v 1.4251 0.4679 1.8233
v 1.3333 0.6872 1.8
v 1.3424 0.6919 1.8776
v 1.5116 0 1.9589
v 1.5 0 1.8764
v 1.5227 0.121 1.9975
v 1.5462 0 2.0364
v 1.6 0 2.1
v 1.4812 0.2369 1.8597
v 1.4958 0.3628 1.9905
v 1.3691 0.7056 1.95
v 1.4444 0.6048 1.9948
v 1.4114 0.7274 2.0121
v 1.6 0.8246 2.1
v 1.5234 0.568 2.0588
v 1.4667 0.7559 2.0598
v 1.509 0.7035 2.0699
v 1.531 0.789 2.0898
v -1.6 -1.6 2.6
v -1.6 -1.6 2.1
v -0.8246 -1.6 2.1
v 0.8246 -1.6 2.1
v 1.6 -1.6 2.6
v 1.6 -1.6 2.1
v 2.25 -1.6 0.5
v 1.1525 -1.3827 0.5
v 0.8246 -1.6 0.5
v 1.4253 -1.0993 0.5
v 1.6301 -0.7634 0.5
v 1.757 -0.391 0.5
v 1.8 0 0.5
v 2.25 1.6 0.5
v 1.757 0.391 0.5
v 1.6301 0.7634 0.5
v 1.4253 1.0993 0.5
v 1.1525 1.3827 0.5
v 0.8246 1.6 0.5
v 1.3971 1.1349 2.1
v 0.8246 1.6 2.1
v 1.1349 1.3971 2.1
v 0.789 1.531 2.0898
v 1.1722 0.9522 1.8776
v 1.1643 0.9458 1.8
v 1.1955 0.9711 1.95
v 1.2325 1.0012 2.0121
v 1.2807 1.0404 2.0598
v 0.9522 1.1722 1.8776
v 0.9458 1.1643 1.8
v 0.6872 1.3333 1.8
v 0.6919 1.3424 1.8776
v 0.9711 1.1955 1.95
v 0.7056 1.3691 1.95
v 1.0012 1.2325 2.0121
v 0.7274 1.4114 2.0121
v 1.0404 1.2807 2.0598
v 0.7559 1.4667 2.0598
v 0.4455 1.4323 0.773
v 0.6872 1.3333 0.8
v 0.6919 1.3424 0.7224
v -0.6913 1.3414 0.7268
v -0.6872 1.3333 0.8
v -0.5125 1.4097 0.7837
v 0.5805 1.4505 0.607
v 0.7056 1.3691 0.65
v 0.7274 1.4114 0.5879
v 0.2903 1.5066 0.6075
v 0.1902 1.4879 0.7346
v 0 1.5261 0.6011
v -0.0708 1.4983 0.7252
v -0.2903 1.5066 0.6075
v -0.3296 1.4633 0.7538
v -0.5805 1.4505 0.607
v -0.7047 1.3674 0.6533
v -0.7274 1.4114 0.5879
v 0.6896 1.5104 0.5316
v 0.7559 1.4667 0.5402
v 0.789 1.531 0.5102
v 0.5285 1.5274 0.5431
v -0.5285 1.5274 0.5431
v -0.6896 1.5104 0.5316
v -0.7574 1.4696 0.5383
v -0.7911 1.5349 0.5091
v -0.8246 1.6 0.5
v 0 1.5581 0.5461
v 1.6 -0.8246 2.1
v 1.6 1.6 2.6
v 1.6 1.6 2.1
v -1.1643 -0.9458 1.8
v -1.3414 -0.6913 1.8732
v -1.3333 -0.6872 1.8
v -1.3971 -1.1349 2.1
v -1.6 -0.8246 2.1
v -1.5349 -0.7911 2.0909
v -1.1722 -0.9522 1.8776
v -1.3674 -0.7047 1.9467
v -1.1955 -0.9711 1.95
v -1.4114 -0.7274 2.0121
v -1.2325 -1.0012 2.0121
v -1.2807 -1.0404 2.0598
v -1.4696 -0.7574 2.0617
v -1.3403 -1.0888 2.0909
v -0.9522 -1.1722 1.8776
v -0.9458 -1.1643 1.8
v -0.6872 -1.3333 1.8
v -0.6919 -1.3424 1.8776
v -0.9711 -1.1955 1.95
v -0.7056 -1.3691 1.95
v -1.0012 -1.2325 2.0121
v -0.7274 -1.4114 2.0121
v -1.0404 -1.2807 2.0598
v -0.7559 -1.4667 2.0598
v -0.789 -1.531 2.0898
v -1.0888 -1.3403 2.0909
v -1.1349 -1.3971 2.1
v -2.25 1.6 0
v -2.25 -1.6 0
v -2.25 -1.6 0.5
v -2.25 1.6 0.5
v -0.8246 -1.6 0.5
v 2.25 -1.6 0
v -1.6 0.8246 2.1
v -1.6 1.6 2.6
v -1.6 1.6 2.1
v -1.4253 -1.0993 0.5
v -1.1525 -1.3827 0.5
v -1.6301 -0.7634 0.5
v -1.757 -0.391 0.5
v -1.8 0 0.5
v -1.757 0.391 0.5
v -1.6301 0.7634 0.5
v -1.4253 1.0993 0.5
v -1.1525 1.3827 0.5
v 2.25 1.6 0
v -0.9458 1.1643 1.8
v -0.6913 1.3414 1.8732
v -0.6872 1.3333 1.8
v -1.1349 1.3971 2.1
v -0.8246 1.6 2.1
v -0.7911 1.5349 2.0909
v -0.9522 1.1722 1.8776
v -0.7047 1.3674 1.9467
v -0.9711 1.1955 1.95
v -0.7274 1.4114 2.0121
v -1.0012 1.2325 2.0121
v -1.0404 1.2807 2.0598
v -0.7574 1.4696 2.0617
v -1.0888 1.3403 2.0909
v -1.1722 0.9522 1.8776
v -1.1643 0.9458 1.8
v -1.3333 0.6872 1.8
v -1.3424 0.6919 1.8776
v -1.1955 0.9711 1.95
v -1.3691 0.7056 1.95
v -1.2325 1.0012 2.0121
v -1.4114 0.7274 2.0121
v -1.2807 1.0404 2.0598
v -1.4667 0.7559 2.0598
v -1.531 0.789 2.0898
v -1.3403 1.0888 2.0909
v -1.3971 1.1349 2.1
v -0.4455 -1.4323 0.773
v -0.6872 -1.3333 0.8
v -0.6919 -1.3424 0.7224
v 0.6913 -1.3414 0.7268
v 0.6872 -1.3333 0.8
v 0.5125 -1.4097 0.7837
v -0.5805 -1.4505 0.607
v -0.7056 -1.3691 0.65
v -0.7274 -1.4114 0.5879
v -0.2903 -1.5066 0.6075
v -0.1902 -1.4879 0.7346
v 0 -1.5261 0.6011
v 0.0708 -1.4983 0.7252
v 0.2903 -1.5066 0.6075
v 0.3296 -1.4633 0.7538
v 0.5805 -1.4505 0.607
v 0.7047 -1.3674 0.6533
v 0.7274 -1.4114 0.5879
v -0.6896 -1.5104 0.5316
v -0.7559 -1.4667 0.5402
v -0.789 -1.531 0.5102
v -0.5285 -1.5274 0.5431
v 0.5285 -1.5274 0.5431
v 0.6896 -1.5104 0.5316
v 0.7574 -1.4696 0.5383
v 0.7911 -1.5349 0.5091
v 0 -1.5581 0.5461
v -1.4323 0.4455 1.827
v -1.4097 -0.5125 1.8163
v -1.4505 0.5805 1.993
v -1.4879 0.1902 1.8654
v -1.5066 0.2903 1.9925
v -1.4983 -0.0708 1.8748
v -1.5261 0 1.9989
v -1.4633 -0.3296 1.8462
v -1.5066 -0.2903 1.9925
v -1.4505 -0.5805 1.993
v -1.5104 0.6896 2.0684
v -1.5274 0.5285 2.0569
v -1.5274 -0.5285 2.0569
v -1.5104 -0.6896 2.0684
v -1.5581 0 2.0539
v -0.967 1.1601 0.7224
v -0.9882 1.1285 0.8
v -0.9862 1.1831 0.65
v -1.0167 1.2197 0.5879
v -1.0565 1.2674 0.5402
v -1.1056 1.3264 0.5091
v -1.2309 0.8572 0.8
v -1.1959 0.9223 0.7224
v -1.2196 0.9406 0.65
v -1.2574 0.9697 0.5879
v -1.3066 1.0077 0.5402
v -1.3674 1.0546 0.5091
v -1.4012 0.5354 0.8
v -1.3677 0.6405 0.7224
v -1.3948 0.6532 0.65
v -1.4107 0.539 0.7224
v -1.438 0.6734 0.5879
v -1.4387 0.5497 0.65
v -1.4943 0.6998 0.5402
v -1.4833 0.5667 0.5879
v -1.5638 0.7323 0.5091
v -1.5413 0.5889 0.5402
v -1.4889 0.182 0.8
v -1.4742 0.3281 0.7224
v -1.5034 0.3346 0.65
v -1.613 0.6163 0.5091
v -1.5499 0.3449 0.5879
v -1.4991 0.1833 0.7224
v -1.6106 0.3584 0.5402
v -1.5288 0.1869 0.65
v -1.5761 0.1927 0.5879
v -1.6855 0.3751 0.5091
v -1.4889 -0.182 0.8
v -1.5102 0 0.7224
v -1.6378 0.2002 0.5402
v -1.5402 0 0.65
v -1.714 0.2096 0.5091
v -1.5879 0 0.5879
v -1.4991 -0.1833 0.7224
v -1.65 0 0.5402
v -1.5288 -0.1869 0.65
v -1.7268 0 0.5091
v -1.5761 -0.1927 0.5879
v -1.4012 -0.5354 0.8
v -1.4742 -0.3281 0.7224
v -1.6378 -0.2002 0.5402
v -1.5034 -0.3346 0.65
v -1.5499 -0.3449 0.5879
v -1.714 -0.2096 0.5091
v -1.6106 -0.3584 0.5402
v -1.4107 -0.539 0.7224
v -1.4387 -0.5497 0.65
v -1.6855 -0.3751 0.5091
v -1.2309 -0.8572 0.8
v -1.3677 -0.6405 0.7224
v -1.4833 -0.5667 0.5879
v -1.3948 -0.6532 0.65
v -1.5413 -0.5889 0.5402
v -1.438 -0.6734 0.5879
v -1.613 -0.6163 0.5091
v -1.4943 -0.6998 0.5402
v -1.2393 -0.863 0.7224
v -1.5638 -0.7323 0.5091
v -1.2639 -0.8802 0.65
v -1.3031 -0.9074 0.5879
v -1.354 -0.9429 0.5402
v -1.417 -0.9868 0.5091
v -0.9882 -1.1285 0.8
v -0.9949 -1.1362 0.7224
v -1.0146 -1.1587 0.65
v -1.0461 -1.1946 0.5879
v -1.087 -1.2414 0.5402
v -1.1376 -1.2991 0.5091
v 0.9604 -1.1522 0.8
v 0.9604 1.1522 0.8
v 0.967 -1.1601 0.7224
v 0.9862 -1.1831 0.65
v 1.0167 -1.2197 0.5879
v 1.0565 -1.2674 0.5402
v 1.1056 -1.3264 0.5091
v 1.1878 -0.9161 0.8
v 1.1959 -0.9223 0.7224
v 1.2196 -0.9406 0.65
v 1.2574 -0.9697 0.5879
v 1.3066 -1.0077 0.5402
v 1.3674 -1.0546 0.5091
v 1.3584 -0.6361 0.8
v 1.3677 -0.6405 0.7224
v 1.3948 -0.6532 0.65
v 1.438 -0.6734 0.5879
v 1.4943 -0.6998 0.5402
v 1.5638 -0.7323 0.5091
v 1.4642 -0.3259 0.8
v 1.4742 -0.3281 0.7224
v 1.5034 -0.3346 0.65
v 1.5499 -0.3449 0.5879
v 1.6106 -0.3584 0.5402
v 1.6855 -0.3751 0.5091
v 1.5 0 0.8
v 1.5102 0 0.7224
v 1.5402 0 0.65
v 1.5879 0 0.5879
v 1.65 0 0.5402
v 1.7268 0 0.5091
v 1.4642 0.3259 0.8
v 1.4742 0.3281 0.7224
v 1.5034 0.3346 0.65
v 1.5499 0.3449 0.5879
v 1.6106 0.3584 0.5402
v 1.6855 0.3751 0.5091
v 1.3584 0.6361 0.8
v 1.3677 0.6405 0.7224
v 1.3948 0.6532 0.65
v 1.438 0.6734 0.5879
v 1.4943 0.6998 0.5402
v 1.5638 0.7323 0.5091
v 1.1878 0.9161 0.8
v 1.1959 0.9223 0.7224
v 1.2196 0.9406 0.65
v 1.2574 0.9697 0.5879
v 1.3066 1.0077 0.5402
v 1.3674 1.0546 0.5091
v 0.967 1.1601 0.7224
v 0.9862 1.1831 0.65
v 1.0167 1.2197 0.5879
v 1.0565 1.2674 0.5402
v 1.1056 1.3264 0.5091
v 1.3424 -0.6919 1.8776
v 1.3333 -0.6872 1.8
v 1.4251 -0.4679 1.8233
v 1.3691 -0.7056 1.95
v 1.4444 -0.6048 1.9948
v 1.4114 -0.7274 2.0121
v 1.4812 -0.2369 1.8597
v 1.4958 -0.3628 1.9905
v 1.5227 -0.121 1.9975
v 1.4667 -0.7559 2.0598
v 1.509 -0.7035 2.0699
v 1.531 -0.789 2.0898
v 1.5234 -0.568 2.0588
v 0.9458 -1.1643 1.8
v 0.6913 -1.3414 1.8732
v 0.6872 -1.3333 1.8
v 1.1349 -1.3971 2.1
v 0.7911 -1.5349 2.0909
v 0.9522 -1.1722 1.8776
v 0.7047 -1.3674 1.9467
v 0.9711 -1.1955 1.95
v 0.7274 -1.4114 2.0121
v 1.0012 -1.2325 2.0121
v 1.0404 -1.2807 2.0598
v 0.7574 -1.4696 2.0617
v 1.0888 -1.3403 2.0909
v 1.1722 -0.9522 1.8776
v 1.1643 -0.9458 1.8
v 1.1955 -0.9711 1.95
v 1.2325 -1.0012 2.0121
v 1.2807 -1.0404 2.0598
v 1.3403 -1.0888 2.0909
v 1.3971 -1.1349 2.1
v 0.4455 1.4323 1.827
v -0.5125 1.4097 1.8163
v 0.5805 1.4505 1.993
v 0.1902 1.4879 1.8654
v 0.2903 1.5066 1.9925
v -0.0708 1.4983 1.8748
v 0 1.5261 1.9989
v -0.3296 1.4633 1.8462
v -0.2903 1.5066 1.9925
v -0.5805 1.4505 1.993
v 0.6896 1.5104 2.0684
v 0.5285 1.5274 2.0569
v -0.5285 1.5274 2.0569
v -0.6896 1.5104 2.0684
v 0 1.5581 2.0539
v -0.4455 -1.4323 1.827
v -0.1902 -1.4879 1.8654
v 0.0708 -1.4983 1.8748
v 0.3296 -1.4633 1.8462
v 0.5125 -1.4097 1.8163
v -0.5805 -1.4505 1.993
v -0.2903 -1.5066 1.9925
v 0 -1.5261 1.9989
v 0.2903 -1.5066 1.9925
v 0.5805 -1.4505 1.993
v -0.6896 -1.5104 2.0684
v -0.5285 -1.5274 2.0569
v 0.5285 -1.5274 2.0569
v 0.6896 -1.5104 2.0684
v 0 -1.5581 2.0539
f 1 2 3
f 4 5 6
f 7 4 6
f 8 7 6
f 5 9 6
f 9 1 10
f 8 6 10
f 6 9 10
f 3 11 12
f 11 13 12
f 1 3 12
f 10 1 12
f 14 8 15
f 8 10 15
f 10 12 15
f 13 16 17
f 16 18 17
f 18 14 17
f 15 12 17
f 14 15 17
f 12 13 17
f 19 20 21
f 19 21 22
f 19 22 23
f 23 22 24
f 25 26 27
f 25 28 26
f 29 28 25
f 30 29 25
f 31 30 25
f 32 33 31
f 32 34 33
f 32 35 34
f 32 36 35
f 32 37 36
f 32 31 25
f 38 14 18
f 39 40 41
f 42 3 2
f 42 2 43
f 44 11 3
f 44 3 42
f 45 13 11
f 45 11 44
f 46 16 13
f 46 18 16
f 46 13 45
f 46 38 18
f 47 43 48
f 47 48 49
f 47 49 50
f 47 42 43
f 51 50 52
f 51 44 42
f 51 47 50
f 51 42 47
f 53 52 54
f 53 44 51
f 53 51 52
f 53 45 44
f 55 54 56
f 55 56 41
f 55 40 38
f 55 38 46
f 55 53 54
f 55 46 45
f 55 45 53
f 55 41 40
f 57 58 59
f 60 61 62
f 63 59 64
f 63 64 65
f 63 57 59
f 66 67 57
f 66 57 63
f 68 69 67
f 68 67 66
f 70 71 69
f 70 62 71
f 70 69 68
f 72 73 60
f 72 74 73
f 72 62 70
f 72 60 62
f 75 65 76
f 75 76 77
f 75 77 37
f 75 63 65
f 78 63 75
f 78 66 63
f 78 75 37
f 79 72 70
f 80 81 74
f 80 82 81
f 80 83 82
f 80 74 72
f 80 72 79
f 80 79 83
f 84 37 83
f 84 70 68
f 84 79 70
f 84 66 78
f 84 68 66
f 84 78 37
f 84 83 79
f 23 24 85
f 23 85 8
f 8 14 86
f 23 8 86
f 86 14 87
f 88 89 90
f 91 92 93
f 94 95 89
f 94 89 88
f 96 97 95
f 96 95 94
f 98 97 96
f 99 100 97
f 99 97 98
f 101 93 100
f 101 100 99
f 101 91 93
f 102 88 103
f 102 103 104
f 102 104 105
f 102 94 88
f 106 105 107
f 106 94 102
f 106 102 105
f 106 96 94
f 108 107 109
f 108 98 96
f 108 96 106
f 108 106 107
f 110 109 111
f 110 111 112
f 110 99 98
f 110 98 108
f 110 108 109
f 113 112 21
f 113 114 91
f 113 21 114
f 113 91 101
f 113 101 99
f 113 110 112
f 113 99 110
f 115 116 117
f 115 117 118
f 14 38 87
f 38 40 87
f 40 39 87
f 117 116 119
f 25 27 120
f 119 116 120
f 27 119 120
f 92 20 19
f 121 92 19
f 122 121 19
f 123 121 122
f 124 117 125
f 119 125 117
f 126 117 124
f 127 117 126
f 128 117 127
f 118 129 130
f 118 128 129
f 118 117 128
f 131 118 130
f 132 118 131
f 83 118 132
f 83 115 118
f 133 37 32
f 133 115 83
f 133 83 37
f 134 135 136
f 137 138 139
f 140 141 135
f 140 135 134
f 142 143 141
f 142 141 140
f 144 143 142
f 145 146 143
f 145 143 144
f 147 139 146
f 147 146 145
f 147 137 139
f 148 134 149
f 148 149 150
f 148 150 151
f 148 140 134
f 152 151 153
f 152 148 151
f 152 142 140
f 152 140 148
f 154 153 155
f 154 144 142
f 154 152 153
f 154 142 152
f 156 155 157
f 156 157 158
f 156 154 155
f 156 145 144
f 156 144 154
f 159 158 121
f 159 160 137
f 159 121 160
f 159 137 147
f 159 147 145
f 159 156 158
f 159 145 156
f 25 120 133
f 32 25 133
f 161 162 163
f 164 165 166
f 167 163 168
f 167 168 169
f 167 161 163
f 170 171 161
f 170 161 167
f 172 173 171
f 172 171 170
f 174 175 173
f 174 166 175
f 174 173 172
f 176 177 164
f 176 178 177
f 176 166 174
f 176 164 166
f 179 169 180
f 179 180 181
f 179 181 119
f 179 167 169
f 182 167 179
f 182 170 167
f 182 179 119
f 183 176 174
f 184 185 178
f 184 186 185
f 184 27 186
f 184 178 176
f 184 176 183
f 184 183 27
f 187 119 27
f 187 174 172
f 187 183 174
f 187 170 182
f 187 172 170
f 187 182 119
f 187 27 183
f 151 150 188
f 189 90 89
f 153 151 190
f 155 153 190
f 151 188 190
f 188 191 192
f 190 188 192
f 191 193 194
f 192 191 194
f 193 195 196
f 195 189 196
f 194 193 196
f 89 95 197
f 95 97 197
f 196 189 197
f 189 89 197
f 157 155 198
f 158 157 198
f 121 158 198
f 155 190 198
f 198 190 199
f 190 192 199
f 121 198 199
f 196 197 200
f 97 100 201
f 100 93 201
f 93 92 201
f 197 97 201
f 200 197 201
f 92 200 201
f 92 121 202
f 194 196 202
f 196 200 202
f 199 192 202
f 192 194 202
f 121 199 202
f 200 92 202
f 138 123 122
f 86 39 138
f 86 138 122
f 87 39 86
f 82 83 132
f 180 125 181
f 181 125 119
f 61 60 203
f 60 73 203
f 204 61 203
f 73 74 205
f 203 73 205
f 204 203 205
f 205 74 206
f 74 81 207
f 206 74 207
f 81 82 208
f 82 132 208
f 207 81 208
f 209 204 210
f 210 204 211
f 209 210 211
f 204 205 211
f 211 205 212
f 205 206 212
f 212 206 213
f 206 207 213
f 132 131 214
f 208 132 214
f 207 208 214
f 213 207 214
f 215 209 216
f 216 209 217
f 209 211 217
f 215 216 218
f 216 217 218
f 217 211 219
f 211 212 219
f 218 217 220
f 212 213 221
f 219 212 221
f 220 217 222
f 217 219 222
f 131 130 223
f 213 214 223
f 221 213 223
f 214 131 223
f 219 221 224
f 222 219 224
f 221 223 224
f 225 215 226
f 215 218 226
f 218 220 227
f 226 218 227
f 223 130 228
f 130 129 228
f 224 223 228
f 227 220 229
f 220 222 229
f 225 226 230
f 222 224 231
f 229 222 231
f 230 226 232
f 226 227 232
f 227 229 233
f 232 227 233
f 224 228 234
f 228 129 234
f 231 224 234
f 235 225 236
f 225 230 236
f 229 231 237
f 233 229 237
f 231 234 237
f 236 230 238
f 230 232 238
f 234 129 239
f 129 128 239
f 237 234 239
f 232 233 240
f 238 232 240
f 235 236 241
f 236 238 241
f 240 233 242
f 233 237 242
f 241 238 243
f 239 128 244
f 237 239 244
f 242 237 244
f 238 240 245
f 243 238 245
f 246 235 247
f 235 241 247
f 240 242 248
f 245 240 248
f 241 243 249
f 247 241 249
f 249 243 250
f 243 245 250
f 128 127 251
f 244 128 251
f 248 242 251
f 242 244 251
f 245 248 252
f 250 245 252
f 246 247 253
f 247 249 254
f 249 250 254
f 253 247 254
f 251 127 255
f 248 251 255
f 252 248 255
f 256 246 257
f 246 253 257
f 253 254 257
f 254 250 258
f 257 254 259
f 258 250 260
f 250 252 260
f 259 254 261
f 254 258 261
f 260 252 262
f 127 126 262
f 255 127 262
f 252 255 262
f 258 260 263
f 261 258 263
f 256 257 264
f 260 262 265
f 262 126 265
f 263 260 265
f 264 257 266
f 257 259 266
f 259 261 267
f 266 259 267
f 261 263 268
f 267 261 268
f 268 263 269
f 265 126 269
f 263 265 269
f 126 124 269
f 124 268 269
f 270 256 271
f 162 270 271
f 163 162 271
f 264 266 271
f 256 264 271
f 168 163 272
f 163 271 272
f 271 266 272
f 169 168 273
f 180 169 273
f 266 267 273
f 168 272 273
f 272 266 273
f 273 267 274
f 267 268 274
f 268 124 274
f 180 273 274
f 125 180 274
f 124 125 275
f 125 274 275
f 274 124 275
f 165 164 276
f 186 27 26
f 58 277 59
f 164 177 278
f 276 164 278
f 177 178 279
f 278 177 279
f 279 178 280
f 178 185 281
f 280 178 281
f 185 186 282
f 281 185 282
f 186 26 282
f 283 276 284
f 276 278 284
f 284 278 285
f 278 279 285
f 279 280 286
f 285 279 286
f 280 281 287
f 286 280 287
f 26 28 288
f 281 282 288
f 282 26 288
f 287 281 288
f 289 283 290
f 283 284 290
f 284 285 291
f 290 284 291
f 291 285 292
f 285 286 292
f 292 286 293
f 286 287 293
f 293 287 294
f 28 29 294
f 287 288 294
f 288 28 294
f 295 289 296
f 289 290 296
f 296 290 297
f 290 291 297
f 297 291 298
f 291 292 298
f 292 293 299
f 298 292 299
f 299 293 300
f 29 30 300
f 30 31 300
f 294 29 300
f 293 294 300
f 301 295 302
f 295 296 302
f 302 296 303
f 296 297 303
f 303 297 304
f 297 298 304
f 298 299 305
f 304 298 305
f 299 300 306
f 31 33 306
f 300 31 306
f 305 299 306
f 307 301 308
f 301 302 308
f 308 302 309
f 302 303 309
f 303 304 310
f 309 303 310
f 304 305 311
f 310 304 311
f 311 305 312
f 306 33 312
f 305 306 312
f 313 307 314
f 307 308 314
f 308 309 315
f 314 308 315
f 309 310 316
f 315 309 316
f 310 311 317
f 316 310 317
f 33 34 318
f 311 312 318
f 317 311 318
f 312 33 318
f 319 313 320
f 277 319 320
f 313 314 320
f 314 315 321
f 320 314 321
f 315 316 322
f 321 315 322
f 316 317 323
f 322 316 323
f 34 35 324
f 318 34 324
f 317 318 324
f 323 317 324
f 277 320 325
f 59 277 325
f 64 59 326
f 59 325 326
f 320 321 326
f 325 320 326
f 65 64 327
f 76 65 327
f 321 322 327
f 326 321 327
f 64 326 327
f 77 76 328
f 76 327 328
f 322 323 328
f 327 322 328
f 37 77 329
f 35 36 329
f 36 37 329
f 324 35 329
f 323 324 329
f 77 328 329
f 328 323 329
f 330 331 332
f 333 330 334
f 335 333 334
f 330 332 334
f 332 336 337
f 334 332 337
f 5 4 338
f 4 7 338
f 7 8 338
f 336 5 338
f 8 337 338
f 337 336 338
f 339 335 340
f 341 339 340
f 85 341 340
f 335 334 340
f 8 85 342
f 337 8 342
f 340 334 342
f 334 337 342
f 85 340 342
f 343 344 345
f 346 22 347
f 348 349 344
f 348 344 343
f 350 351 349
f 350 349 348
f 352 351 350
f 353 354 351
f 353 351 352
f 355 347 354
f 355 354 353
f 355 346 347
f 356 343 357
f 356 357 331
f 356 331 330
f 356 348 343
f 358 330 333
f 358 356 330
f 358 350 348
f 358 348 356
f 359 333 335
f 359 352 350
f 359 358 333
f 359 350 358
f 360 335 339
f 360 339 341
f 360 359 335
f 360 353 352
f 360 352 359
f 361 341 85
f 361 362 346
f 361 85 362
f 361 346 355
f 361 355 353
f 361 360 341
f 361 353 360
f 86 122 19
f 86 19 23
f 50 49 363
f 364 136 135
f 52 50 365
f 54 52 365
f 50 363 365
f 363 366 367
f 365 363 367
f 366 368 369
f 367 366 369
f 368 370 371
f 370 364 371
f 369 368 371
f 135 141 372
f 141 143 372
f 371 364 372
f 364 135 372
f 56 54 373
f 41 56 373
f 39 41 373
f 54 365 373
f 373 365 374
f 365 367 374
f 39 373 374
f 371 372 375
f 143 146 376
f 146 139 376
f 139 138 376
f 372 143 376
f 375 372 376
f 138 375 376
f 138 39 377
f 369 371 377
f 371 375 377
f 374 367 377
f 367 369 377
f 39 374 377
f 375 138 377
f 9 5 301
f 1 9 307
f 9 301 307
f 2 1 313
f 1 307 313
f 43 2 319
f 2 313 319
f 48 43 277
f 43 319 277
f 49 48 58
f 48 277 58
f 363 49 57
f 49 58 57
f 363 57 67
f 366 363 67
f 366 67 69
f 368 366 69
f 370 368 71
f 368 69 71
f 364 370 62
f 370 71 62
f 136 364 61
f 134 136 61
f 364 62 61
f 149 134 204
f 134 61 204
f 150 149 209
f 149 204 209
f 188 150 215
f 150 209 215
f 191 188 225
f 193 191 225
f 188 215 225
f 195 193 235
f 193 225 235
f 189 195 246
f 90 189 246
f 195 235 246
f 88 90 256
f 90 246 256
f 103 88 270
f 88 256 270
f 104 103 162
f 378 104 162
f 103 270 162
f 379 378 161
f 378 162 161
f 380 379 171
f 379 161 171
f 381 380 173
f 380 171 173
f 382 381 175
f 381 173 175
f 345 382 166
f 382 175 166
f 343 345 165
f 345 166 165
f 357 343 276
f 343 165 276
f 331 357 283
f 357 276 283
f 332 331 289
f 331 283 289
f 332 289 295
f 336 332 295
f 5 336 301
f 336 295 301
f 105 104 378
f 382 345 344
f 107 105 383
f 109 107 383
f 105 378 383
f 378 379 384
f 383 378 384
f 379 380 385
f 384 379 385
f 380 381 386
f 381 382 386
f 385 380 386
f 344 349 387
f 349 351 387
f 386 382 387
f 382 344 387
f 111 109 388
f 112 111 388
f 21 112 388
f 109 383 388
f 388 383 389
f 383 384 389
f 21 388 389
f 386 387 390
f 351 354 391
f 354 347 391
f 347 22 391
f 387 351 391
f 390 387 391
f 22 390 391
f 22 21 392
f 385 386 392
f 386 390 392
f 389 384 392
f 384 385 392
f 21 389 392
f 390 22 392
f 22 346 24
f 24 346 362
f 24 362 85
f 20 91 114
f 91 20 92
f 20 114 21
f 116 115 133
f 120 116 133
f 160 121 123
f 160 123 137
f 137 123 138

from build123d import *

# Parameters (mm, degrees)
SKETCH_1_W      = 4.5
SKETCH_1_H      = 3.2
EXTRUDE_1_DEPTH = 0.5
SKETCH_2_R      = 1.5
EXTRUDE_2_DEPTH = 1.6
SKETCH_3_W      = 3.2
SKETCH_3_H      = 3.2
EXTRUDE_3_DEPTH = 0.5
FILLET_1_R      = 0.3
FILLET_2_R      = 0.3


with BuildPart() as part:
    # Эскиз1 → Бобышка-Вытянуть1 (new body)
    with BuildSketch(Plane.XY):
        Rectangle(SKETCH_1_W, SKETCH_1_H)
    extrude(amount=EXTRUDE_1_DEPTH)

    # Эскиз2 → Бобышка-Вытянуть2 (add)
    with BuildSketch(Plane.XY.offset(0.5)):
        Circle(SKETCH_2_R)
    extrude(amount=EXTRUDE_2_DEPTH)

    # Эскиз3 → Бобышка-Вытянуть3 (add)
    with BuildSketch(Plane.XY.offset(2.1)):
        Rectangle(SKETCH_3_W, SKETCH_3_H)
    extrude(amount=EXTRUDE_3_DEPTH)

    # Скругление1
    fillet_1_edges = [part.edges().sort_by_distance(p)[0] for p in [
        (-1.5, 0, 0.5),
    ]]
    fillet(fillet_1_edges, radius=FILLET_1_R)

    # Скругление2
    fillet_2_edges = [part.edges().sort_by_distance(p)[0] for p in [
        (-1.5, 0, 2.1),
    ]]
    fillet(fillet_2_edges, radius=FILLET_2_R)


solid = part.part
